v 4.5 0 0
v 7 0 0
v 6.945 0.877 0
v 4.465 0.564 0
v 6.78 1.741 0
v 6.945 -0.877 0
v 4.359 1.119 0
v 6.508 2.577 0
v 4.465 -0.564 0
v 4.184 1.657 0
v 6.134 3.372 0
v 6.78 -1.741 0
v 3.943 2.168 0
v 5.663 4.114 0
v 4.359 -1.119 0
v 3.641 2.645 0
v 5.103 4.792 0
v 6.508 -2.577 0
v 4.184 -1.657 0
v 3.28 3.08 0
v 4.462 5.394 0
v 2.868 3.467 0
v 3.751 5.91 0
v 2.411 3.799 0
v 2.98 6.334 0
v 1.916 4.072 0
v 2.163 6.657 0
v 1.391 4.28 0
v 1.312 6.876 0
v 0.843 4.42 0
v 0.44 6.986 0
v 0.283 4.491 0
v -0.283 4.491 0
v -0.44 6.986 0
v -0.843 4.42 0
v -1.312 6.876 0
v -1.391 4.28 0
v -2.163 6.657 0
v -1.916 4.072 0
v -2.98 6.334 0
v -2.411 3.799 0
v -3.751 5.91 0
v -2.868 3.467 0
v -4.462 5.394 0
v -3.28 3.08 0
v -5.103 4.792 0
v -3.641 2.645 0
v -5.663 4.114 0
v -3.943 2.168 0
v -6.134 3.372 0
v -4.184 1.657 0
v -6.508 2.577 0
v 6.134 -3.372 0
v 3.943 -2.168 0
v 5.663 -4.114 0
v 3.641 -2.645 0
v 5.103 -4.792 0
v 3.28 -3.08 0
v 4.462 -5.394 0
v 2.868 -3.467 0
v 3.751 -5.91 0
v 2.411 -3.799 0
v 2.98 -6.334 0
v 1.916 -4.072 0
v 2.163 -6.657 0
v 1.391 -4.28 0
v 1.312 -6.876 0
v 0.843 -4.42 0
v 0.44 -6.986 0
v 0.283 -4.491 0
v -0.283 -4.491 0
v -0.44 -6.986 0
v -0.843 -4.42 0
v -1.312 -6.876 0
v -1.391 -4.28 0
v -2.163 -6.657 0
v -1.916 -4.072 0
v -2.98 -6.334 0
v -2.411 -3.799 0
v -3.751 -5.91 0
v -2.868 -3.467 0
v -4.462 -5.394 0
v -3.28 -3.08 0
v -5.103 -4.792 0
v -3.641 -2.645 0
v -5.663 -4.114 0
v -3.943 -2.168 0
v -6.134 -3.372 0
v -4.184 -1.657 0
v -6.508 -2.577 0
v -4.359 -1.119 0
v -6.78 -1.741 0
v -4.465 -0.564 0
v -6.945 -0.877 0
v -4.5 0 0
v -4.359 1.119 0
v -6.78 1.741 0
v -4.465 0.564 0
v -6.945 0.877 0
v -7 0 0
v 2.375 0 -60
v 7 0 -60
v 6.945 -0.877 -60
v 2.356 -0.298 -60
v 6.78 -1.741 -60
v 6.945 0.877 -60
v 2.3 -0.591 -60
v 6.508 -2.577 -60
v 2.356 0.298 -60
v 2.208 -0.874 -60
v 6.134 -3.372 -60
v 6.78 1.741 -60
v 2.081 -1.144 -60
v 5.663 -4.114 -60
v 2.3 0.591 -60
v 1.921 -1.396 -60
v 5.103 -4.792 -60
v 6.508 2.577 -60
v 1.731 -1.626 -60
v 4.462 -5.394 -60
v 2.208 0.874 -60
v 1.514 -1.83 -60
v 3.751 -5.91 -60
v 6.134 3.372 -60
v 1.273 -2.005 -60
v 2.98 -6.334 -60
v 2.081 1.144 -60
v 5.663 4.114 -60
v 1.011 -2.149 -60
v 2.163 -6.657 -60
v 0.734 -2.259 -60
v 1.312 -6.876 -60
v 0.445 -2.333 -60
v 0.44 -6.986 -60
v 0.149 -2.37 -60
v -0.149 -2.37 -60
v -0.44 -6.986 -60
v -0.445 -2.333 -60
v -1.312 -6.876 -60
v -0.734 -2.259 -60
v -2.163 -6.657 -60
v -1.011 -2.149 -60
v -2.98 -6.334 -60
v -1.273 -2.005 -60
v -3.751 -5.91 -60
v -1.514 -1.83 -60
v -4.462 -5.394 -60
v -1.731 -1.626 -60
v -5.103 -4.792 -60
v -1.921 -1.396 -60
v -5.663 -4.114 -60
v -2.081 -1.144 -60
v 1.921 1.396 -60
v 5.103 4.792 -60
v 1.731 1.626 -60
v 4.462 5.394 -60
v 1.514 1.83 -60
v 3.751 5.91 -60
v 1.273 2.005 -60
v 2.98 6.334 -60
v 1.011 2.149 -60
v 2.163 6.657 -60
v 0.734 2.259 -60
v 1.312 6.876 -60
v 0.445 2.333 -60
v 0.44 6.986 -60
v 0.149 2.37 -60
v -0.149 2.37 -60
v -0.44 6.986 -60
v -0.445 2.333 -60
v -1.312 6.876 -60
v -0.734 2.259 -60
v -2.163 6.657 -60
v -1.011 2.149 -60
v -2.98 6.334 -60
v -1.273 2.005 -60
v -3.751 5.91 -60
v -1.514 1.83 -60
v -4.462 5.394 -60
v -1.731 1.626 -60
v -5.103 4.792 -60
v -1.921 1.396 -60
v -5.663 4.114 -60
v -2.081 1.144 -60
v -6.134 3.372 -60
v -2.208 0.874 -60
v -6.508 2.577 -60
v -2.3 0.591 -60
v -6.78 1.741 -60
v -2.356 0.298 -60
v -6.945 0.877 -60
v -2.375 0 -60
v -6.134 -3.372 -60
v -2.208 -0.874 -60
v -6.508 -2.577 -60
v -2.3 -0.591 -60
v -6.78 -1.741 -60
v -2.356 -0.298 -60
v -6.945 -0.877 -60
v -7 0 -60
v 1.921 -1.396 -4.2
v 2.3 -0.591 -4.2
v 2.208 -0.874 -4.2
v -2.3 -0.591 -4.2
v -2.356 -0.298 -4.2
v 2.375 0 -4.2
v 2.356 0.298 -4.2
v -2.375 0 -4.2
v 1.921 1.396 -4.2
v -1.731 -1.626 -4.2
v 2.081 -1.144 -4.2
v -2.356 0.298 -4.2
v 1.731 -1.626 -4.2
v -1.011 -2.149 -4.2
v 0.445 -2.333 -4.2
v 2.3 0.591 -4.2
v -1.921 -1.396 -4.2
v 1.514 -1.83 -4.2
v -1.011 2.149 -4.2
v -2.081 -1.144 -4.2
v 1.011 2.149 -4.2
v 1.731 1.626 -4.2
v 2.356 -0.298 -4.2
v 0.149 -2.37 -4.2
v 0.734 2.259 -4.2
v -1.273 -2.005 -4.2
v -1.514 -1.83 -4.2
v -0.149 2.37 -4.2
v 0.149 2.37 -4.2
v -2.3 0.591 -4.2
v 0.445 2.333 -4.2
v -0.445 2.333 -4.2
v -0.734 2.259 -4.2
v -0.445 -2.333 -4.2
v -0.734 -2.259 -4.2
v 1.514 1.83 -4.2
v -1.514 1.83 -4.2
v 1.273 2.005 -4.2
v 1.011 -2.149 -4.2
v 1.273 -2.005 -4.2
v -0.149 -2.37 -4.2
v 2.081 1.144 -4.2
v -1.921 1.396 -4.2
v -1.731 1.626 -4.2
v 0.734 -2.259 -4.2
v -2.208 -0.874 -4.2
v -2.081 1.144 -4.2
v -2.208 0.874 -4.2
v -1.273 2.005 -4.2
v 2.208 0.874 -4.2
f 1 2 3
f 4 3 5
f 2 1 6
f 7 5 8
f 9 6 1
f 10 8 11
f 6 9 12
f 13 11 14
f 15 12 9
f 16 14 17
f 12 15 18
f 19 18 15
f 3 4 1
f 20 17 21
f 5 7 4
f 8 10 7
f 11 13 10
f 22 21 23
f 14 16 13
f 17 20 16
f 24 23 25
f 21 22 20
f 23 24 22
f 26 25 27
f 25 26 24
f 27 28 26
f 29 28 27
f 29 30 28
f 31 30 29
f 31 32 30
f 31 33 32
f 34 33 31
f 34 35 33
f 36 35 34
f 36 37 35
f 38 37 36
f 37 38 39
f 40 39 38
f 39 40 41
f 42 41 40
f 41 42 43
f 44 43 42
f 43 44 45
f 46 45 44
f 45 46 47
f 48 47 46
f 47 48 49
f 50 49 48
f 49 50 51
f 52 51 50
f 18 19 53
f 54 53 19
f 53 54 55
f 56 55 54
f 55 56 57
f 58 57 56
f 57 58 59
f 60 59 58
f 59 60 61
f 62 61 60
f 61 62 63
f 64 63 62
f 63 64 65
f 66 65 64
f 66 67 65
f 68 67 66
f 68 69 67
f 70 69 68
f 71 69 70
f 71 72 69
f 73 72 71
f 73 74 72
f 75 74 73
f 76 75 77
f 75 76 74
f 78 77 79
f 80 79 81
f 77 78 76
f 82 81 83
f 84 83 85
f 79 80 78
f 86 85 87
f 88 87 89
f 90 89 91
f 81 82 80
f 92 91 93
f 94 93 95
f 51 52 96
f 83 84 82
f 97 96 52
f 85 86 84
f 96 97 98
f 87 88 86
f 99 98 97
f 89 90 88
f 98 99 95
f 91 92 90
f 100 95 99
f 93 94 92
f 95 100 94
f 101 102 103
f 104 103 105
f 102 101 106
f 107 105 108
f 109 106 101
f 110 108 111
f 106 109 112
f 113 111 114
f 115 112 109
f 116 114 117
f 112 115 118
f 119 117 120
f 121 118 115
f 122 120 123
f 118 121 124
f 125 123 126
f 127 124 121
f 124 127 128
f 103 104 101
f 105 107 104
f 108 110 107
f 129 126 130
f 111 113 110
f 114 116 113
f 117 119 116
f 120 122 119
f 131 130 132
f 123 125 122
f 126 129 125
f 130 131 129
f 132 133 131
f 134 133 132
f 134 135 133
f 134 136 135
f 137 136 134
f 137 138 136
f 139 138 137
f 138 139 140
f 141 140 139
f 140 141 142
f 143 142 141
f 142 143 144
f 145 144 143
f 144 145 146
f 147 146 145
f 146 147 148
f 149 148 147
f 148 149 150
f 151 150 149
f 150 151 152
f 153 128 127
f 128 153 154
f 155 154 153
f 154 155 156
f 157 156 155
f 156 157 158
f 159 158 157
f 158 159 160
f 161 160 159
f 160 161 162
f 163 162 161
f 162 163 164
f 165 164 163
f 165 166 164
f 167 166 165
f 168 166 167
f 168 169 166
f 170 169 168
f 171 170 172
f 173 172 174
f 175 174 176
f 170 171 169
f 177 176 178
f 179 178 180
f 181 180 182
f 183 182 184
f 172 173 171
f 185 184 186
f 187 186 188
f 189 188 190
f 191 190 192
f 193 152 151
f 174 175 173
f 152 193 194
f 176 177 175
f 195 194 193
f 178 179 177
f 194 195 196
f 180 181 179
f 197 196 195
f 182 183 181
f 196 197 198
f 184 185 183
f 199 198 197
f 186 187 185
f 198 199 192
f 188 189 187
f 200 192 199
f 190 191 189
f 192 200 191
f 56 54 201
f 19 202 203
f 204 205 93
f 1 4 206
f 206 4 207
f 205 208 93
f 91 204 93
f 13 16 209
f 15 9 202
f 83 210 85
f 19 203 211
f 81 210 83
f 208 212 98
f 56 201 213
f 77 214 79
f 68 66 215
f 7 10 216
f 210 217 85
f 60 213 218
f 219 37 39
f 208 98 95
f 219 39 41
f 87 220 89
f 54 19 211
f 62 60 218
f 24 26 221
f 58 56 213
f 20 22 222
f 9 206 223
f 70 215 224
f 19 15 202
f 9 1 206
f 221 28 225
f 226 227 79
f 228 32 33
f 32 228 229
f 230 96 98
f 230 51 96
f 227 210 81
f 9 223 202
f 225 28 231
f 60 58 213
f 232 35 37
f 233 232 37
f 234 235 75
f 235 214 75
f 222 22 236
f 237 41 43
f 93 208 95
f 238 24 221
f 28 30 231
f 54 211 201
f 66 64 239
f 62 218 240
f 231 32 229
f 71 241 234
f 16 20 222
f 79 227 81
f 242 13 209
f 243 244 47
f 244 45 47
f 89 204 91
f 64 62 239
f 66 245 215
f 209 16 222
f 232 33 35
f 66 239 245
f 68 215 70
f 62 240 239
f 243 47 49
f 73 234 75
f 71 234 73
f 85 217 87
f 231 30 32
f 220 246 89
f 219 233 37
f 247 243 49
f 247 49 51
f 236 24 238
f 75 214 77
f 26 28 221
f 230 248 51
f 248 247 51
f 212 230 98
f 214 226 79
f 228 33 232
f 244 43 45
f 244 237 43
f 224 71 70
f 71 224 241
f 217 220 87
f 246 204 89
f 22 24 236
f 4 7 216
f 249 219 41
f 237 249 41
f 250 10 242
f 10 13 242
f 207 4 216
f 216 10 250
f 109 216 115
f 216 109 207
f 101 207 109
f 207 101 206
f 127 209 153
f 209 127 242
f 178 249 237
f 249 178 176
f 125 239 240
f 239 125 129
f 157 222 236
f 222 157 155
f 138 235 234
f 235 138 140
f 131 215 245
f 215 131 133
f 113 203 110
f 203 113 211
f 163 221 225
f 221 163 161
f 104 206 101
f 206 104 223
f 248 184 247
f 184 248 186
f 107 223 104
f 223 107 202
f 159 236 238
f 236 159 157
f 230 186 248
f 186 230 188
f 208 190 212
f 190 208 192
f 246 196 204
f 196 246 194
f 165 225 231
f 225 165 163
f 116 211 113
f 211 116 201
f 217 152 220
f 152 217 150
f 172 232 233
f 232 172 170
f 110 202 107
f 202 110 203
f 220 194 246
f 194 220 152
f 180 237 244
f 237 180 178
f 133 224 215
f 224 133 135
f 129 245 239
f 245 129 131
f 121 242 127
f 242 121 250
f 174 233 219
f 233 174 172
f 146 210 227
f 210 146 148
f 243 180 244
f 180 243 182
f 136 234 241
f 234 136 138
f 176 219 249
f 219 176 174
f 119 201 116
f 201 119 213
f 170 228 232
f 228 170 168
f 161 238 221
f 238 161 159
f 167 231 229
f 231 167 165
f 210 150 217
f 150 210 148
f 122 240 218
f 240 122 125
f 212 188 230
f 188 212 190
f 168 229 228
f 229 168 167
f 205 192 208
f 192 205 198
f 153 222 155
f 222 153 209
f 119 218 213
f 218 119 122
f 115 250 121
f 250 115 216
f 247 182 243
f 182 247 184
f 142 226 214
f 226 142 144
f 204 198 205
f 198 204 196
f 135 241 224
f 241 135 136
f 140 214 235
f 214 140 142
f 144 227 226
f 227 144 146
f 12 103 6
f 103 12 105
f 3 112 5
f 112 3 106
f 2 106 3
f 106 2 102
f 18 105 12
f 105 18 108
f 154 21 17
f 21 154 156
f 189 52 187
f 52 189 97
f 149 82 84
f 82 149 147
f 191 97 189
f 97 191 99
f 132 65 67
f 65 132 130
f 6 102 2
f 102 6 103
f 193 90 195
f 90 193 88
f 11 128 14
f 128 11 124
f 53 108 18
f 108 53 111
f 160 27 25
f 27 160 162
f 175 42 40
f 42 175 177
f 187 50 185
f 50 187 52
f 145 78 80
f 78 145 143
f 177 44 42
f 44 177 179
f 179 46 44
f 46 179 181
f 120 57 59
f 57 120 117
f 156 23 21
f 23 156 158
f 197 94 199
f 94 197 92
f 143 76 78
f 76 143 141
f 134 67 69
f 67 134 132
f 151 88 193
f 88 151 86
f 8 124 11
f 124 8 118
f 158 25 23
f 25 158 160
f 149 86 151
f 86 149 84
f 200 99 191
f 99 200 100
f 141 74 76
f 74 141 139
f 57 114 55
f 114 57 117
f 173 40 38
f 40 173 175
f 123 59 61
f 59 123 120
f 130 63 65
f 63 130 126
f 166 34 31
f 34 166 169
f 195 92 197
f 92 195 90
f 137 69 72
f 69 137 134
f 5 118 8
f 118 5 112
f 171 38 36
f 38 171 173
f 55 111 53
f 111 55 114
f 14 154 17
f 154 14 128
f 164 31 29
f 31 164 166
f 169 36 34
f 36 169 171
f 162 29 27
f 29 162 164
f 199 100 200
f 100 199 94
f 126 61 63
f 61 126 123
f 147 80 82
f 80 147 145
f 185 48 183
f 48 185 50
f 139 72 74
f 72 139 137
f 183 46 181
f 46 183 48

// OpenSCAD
$fn = 50;


difference() {
	union() {
		translate(v = [0, 0, -60.0000000000]) {
			cylinder(h = 60, r = 7.0000000000);
		}
		cylinder(h = 0, r = 10.0000000000);
	}
	union() {
		translate(v = [0, 0, 0]) {
			rotate(a = [0, 0, 0]) {
				difference() {
					union() {
						#translate(v = [0, 0, -60.0000000000]) {
							cylinder(h = 60, r = 2.2500000000);
						}
						#translate(v = [0, 0, -4.2000000000]) {
							cylinder(h = 4.2000000000, r1 = 2.3750000000, r2 = 4.5000000000);
						}
						#translate(v = [0, 0, -60.0000000000]) {
							cylinder(h = 60, r = 2.3750000000);
						}
						#translate(v = [0, 0, -60.0000000000]) {
							cylinder(h = 60, r = 2.2500000000);
						}
					}
					union();
				}
			}
		}
	}
}
